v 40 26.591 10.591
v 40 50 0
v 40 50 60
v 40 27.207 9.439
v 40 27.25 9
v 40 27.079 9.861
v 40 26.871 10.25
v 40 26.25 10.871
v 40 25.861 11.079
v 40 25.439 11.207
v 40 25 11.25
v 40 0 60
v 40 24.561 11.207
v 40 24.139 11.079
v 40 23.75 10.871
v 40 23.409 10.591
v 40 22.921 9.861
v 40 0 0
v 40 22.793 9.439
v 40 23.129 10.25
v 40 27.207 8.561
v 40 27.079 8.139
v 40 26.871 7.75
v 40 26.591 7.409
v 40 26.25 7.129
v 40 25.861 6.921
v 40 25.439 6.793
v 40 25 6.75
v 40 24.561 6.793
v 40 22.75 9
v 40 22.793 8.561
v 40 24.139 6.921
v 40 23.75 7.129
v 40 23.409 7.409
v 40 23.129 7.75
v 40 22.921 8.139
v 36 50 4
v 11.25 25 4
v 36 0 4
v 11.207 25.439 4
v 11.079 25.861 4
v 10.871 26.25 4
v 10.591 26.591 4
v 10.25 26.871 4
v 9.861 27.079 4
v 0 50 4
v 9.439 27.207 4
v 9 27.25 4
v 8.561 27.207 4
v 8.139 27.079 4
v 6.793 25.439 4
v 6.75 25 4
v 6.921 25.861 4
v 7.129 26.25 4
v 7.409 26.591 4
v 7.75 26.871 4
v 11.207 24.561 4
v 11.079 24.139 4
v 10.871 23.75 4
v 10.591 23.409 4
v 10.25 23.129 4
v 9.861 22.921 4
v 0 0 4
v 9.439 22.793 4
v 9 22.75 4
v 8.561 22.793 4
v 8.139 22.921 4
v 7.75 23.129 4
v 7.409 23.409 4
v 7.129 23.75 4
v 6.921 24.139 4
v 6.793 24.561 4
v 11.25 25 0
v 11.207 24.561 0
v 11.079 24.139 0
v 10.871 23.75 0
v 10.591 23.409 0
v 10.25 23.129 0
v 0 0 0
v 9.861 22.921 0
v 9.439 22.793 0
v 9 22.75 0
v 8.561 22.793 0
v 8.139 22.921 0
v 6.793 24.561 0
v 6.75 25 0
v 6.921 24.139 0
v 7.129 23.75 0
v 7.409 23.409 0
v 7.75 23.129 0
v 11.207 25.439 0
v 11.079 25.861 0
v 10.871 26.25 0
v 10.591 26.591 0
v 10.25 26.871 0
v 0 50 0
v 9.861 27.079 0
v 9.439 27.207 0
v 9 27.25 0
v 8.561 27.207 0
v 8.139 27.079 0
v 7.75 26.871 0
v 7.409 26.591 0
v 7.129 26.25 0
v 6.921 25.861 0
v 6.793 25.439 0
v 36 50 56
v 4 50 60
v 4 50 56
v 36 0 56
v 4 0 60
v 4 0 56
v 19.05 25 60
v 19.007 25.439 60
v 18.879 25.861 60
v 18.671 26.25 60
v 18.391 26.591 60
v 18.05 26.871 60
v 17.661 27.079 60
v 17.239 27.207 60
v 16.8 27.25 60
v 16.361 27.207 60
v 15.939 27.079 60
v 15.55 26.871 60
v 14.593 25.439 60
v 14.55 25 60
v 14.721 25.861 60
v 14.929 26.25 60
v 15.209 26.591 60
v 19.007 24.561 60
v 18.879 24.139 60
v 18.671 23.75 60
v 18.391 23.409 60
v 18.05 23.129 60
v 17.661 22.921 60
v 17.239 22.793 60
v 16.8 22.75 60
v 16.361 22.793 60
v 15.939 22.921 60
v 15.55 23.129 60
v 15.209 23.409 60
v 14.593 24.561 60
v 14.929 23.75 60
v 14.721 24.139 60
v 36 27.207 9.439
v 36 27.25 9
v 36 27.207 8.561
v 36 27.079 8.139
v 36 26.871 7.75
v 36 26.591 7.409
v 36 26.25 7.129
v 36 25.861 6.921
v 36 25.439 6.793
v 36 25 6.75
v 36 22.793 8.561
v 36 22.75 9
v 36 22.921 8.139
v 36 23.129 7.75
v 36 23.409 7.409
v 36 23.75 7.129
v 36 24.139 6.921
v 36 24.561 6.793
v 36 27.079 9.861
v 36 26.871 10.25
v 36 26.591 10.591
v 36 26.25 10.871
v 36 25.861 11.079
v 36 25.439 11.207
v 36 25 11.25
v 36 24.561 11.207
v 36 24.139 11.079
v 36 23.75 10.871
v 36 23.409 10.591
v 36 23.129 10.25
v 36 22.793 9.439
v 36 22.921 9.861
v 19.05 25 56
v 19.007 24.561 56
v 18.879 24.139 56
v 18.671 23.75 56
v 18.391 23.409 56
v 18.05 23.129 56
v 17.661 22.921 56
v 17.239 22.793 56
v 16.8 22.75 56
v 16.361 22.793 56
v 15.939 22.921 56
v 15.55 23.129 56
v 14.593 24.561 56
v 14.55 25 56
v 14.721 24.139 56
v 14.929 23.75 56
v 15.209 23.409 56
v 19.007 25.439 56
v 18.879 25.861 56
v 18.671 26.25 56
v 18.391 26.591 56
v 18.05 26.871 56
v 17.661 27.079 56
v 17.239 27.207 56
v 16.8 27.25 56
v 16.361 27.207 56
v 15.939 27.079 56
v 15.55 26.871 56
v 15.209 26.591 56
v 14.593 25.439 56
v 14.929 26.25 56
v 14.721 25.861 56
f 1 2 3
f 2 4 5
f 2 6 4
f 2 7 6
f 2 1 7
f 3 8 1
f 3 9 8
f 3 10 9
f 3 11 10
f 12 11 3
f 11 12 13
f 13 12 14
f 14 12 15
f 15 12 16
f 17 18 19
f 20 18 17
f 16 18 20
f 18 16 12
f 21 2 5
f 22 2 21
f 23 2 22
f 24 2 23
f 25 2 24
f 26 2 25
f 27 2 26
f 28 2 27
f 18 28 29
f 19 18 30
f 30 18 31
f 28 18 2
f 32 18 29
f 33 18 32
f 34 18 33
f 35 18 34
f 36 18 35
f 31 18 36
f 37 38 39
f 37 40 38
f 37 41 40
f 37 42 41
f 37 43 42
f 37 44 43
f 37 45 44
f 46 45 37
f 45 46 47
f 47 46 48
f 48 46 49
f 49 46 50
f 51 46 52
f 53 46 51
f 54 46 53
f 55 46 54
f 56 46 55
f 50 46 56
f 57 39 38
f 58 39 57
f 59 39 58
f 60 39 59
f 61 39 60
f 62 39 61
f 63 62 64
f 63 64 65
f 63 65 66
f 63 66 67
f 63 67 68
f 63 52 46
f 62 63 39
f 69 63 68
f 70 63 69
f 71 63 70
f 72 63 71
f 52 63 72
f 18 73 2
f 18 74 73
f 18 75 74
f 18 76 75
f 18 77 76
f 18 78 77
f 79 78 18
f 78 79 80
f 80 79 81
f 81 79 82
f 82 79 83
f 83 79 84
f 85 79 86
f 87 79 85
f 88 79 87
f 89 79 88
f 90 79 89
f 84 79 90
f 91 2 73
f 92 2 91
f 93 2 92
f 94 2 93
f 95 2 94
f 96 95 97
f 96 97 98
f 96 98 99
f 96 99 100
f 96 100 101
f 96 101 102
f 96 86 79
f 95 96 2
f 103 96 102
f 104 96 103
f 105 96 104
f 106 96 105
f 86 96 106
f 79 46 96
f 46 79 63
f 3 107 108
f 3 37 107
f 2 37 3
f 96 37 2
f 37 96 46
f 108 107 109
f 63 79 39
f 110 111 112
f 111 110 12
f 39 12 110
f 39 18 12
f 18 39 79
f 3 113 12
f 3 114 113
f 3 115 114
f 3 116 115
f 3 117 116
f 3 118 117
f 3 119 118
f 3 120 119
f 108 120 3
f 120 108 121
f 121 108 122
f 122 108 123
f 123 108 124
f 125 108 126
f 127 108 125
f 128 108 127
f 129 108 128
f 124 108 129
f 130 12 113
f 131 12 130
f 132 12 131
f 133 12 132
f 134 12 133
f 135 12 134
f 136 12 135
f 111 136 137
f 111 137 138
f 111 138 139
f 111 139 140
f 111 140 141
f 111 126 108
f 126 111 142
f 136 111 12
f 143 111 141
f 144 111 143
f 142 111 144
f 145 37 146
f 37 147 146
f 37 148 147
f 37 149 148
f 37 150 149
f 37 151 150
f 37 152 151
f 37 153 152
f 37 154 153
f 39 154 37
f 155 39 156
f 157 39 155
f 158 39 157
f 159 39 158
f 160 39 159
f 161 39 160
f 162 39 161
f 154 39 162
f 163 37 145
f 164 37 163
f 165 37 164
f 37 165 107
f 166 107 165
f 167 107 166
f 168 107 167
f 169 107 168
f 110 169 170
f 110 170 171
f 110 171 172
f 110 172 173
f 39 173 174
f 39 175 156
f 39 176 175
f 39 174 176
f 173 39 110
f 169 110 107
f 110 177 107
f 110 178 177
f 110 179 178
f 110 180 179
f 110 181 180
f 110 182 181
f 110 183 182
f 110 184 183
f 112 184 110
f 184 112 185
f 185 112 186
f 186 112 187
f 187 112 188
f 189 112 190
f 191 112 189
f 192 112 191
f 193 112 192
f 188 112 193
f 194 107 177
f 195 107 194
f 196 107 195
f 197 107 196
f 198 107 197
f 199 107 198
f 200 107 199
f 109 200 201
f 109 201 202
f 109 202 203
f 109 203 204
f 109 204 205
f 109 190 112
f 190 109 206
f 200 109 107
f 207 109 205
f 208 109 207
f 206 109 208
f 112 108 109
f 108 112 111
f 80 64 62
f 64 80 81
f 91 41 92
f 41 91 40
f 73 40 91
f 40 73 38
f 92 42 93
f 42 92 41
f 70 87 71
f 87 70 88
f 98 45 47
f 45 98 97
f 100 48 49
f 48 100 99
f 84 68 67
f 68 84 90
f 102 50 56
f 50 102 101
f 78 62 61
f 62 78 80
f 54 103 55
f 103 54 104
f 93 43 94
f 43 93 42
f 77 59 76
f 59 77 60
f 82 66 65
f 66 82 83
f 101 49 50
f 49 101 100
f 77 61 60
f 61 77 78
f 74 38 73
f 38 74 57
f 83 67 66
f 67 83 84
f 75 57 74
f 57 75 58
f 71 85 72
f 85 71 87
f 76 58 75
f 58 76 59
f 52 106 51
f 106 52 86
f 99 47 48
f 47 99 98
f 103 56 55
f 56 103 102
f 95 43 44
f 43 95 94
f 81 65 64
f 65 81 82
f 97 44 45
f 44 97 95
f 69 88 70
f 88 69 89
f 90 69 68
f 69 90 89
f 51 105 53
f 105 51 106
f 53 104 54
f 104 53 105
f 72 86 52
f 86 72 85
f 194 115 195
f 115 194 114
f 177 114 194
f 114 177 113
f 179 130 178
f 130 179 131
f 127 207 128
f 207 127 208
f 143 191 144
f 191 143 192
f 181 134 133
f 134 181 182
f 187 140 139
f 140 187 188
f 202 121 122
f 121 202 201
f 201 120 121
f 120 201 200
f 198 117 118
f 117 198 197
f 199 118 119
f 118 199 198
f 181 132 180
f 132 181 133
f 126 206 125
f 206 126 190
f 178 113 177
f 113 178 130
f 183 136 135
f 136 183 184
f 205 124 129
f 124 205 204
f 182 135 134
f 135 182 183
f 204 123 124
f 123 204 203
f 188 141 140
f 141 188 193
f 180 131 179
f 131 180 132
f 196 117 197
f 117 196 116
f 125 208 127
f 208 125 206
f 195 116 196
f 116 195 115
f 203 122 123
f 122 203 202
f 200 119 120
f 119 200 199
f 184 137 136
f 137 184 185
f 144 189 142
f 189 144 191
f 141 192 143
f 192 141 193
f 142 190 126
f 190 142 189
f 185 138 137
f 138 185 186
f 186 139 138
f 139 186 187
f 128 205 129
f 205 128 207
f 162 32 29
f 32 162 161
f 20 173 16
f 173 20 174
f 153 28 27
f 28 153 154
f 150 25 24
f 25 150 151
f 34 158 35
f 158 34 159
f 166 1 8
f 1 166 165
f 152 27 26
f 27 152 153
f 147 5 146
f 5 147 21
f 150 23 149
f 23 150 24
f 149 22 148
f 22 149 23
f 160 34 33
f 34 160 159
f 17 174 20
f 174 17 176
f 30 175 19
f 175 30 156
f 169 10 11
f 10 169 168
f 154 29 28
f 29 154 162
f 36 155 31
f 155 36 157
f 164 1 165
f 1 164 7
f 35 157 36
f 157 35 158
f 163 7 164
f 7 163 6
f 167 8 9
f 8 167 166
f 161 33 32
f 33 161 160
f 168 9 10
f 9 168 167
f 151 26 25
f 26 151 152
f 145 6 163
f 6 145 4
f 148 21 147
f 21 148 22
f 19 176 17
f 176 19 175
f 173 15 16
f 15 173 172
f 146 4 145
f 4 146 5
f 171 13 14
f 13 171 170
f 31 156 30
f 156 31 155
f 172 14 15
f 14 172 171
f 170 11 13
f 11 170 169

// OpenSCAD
$fn = 32;

// ----------------------------------------------------------------------
// Z-bracket: 40 x 50 x 60 mm
// ----------------------------------------------------------------------

// --- parameters (mm) ---
foot_len = 40;            // lower foot length, X
top_len = 32;             // upper foot length, X
depth = 50;               // bracket width, Y
step_h = 60;              // overall rise, Z
plate_t = 4;              // plate thickness
hole_d = 4.5;             // clearance for M4

module hole_z(px, py, z0) {
  translate([px, py, z0 - 0.5]) cylinder(h = plate_t + 1, d = hole_d);
}
module hole_x(py, pz) {
  translate([-0.5, py, pz]) rotate([0, 90, 0]) cylinder(h = plate_t + 1, d = hole_d);
}

difference() {
  union() {
    cube([foot_len, depth, plate_t]);
    /* web, overlapping the lower foot */
    translate([foot_len - plate_t, 0, 0]) cube([plate_t, depth, step_h]);
    /* upper foot, sunk into the web */
    translate([foot_len - plate_t - top_len, 0, step_h - plate_t]) cube([top_len + plate_t, depth, plate_t]);
  }
  hole_z(9, 25, 0);
  translate([foot_len - plate_t - 19.2, 0, 0]) hole_z(0, 25, step_h - plate_t);
  translate([foot_len - plate_t, 0, 0]) hole_x(25, 9);
}
